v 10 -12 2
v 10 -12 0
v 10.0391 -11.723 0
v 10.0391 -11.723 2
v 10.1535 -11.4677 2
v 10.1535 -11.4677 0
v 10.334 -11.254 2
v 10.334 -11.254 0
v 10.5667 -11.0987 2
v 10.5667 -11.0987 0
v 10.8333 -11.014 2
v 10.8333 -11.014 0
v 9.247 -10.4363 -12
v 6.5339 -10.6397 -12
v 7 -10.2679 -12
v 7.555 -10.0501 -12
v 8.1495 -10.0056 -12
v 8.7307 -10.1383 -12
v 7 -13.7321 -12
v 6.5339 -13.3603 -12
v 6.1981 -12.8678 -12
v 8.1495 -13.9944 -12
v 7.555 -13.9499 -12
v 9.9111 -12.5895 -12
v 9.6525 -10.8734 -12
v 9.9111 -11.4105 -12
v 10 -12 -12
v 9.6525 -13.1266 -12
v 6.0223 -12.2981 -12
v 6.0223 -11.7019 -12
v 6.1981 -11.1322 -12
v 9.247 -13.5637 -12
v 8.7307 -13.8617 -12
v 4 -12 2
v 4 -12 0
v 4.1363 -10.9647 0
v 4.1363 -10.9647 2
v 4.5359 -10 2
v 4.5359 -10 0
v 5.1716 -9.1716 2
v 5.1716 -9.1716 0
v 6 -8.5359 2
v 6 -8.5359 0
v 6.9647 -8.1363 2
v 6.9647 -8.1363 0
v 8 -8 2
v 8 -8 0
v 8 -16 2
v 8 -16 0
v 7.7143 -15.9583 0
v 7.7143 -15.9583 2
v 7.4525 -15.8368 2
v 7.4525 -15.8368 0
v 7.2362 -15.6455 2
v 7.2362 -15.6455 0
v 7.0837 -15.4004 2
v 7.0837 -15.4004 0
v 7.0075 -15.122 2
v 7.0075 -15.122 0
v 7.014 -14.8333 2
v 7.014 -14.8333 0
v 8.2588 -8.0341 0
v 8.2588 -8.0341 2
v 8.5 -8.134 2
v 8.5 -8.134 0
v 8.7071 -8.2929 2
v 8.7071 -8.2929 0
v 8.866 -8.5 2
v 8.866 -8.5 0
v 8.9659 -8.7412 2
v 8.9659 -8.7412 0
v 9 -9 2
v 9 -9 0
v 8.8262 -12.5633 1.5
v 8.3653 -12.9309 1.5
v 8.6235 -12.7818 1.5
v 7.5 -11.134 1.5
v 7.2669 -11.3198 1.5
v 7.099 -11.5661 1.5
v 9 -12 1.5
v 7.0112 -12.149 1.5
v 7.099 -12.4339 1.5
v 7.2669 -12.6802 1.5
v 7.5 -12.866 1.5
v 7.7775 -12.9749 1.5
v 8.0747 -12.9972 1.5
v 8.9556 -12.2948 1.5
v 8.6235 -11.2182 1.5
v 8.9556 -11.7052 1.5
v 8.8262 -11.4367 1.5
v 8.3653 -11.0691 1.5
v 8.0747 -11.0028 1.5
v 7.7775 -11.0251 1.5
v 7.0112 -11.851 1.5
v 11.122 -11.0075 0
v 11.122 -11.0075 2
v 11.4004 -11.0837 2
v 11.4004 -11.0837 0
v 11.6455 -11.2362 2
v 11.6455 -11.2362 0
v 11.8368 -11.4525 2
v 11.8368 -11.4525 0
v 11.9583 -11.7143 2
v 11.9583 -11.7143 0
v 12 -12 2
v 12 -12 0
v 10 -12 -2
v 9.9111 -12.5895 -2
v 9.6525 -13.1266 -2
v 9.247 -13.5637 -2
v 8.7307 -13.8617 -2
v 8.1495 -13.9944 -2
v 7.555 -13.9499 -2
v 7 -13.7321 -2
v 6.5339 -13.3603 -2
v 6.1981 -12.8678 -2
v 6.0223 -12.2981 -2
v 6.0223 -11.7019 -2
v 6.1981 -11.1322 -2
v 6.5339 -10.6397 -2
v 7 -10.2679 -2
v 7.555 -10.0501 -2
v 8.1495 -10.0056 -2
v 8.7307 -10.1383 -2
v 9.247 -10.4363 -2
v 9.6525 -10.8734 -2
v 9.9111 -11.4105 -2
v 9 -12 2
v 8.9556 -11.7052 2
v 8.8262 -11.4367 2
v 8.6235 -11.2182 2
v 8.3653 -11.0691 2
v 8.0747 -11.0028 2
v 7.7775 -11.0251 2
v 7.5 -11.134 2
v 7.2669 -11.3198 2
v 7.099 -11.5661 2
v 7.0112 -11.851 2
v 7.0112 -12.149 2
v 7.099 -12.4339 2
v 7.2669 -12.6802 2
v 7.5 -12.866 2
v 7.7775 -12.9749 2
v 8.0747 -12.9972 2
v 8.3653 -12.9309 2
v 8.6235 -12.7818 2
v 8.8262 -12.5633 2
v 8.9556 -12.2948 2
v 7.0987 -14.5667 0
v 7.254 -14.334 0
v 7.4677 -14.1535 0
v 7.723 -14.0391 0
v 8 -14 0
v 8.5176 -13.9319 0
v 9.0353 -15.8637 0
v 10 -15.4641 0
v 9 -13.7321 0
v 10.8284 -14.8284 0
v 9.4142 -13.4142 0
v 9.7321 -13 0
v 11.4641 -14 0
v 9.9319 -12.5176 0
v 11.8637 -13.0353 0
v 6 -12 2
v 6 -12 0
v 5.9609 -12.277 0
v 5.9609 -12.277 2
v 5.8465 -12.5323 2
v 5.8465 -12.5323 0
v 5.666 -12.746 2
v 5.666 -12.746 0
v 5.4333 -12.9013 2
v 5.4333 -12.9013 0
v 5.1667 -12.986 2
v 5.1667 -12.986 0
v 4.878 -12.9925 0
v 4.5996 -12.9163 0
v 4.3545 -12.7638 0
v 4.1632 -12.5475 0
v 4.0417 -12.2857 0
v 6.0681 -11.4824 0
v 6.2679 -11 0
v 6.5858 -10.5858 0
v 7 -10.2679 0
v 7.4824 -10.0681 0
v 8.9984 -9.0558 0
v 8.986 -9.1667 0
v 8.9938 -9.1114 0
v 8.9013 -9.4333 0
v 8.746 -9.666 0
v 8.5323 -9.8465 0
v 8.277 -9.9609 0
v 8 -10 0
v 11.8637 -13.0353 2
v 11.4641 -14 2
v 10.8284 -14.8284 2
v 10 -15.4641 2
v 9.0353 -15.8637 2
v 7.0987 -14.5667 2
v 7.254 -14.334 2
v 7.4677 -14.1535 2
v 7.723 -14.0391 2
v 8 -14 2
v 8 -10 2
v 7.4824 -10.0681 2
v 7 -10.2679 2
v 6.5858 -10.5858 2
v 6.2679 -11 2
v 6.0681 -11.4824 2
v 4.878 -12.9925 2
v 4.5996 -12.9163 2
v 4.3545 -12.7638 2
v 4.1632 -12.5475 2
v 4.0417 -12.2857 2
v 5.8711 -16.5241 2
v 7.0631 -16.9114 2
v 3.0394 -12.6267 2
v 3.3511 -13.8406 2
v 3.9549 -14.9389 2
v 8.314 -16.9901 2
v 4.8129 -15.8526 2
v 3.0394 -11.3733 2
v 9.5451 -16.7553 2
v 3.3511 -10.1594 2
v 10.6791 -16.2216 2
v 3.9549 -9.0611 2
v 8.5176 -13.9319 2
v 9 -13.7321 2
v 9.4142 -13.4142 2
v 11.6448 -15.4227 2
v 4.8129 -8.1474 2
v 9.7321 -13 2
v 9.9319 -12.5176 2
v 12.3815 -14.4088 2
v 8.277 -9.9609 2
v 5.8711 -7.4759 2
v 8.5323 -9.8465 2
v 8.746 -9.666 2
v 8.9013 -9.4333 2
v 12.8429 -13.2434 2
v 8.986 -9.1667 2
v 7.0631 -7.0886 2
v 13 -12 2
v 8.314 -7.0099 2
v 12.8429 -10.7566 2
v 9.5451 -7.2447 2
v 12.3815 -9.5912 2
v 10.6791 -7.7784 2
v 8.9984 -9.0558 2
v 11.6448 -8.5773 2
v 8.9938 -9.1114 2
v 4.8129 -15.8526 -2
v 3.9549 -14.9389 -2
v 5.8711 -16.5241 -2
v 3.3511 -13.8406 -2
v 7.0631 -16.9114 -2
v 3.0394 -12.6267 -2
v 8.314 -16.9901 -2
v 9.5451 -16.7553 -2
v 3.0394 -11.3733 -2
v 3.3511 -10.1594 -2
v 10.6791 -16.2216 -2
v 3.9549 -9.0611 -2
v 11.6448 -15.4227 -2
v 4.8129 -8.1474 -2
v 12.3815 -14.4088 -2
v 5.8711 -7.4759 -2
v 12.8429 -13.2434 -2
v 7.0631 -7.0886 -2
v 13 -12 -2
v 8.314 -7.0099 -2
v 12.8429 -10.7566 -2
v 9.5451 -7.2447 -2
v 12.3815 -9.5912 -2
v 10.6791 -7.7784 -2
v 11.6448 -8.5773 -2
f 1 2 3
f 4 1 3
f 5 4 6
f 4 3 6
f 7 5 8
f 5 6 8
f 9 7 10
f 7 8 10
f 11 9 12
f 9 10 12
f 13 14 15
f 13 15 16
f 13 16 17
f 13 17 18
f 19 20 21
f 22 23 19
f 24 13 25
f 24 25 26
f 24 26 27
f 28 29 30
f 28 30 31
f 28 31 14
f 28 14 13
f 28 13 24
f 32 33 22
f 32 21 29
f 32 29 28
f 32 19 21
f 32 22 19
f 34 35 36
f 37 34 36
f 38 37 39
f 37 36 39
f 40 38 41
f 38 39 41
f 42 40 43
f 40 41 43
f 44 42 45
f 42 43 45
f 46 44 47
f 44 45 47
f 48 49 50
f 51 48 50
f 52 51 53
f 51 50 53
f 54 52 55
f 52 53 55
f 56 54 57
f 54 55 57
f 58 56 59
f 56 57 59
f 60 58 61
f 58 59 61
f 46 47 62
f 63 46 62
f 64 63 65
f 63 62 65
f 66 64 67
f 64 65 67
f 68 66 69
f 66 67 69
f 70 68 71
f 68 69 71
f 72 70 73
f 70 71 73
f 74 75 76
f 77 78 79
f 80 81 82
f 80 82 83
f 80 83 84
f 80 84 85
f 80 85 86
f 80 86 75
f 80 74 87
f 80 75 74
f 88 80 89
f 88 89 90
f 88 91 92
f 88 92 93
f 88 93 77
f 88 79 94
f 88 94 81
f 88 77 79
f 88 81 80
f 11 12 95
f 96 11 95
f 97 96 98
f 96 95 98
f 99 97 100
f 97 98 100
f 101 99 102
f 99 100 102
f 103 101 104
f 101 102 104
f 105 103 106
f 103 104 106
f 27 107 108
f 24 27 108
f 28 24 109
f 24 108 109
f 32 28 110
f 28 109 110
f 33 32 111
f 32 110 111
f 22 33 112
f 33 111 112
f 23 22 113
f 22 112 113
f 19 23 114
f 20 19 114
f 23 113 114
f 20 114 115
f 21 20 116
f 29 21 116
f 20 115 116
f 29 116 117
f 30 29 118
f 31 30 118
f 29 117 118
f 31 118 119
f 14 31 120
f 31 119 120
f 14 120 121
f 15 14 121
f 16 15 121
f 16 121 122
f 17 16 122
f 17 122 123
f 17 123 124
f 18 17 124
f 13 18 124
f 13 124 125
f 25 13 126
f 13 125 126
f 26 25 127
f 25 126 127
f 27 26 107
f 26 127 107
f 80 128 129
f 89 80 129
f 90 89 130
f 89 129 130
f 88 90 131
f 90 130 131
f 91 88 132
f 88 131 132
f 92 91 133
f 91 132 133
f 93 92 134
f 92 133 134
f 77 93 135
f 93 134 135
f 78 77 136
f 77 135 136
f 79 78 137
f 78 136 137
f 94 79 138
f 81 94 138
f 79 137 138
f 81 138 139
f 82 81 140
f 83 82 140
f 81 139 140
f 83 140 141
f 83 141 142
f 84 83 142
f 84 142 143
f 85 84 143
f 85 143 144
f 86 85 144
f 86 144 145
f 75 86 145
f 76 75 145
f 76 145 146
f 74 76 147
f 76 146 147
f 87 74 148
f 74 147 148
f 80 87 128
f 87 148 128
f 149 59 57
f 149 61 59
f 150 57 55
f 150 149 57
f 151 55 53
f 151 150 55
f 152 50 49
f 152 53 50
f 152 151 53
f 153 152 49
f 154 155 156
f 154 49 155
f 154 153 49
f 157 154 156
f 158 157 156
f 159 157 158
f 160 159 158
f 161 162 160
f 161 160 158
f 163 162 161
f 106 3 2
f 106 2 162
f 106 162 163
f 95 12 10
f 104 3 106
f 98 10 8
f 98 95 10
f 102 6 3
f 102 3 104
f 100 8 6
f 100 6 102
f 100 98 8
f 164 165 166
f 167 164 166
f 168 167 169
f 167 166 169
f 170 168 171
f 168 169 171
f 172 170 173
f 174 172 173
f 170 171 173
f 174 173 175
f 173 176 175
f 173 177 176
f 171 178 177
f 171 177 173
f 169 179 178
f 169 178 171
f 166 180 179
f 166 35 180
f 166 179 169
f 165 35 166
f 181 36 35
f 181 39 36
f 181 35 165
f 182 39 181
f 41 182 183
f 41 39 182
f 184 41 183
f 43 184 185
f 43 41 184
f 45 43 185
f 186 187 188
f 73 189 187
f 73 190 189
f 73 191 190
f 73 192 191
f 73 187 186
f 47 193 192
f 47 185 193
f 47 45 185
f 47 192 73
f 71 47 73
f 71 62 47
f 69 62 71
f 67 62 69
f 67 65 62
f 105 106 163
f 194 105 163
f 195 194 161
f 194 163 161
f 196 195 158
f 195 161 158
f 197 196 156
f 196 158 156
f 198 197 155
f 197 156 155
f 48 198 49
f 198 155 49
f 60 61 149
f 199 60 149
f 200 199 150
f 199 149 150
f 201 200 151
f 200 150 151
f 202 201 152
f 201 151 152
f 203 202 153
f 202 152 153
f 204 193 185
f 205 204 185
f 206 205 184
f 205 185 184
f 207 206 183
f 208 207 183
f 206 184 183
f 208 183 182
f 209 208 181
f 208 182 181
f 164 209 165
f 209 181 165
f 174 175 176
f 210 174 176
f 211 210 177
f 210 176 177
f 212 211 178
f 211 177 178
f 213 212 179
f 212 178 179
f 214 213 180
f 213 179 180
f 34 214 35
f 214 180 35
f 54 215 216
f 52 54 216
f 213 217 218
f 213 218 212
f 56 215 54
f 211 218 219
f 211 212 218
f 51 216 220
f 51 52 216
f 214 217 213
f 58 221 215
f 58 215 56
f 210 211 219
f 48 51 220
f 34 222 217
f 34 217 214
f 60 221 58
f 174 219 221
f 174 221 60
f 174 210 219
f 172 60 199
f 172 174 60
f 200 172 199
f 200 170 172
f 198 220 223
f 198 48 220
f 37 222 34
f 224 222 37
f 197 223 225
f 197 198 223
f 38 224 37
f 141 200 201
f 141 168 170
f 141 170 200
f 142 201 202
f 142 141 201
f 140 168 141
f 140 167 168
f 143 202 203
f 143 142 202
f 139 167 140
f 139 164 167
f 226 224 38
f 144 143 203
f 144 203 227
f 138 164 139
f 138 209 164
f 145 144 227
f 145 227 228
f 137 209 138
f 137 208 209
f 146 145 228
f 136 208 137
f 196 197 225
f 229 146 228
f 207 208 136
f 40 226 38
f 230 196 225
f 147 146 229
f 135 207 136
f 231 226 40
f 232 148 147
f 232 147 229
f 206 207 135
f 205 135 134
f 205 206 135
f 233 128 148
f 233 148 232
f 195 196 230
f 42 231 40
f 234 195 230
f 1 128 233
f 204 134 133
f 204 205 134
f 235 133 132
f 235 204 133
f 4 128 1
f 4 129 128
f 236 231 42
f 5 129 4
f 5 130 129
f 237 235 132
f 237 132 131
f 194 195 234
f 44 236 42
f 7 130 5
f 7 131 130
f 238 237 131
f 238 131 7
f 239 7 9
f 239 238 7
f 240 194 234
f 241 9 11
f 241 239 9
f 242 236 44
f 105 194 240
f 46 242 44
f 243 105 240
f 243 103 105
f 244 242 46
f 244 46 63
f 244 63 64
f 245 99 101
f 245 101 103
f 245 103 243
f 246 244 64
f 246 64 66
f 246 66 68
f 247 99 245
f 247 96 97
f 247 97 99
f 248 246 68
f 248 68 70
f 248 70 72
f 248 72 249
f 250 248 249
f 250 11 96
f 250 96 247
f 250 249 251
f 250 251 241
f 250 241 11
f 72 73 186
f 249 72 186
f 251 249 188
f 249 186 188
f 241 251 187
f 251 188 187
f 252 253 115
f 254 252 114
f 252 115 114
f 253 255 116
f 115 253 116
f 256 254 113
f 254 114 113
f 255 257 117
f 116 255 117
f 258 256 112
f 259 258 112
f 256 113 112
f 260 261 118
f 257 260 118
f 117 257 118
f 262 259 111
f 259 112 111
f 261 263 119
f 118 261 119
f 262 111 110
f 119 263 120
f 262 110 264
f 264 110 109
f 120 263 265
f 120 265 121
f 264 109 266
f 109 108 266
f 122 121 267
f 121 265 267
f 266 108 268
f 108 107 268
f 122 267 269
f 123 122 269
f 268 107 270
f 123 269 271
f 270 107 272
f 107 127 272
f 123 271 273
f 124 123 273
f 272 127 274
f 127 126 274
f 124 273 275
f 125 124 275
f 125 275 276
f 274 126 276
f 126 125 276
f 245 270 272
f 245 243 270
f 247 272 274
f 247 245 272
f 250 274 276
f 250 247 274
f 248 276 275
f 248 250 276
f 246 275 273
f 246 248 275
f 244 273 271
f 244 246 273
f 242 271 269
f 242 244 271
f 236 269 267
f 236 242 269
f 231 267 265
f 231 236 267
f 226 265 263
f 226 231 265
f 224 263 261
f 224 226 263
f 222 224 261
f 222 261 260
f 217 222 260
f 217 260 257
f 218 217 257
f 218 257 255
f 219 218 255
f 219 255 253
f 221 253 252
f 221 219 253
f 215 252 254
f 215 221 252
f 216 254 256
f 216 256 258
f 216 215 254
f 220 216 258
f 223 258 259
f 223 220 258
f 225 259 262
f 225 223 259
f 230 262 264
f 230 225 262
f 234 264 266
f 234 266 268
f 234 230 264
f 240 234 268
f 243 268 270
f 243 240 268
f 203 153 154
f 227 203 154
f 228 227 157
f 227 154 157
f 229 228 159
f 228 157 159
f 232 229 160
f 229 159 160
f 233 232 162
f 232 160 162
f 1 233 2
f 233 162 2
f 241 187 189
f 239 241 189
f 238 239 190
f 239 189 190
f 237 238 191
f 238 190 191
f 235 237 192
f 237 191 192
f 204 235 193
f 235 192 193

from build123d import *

# Parameters (mm, degrees)
F0_R     = 5
F0_R_2   = 1.5
F1_DEPTH = 2
F2_DEPTH = 2
F3_DEPTH = 2
F4_R     = 2
F4_R_2   = 1.5
F5_DEPTH = 10
F6_R     = 1
F7_DEPTH = 0.5


with BuildPart() as f1:
    # F0 (on Top) → F1 (new body)
    with BuildSketch(Plane.XY):
        with Locations((8, -12)):
            Circle(F0_R)
        with BuildLine():
            ThreePointArc((12, -12), (10.8284271247, -14.8284271247), (8, -16))
            ThreePointArc((8, -16), (7.2362373842, -15.6454972244), (7.0139867028, -14.8333333333))
            ThreePointArc((7.0139867028, -14.8333333333), (7.3545027756, -14.2362373842), (8, -14))
            ThreePointArc((8, -14), (9.4142135624, -13.4142135624), (10, -12))
            ThreePointArc((10, -12), (10.2362373842, -11.3545027756), (10.8333333333, -11.0139867028))
            ThreePointArc((10.8333333333, -11.0139867028), (11.6454972244, -11.2362373842), (12, -12))
        make_face(mode=Mode.SUBTRACT)
        with BuildLine():
            ThreePointArc((8, -10), (6.5857864376, -10.5857864376), (6, -12))
            ThreePointArc((6, -12), (5.7637626158, -12.6454972244), (5.1666666667, -12.9860132972))
            ThreePointArc((5.1666666667, -12.9860132972), (4.3545027756, -12.7637626158), (4, -12))
            ThreePointArc((4, -12), (5.1715728753, -9.1715728753), (8, -8))
            ThreePointArc((8, -8), (8.7071067812, -8.2928932188), (9, -9))
            ThreePointArc((9, -9), (8.9964971895, -9.0836262603), (8.9860132972, -9.1666666667))
            ThreePointArc((8.9860132972, -9.1666666667), (8.6454972244, -9.7637626158), (8, -10))
        make_face(mode=Mode.SUBTRACT)
        with Locations((8, -12)):
            Circle(F0_R_2, mode=Mode.SUBTRACT)
        with Locations((8, -12)):
            Circle(F0_R_2)
    extrude(amount=F1_DEPTH)

    # F0 (on Top) → F2 (join)
    with BuildSketch(Plane.XY):
        with Locations((8, -12)):
            Circle(F0_R)
        with BuildLine():
            ThreePointArc((12, -12), (10.8284271247, -14.8284271247), (8, -16))
            ThreePointArc((8, -16), (7.2362373842, -15.6454972244), (7.0139867028, -14.8333333333))
            ThreePointArc((7.0139867028, -14.8333333333), (7.3545027756, -14.2362373842), (8, -14))
            ThreePointArc((8, -14), (9.4142135624, -13.4142135624), (10, -12))
            ThreePointArc((10, -12), (10.2362373842, -11.3545027756), (10.8333333333, -11.0139867028))
            ThreePointArc((10.8333333333, -11.0139867028), (11.6454972244, -11.2362373842), (12, -12))
        make_face(mode=Mode.SUBTRACT)
        with BuildLine():
            ThreePointArc((8, -10), (6.5857864376, -10.5857864376), (6, -12))
            ThreePointArc((6, -12), (5.7637626158, -12.6454972244), (5.1666666667, -12.9860132972))
            ThreePointArc((5.1666666667, -12.9860132972), (4.3545027756, -12.7637626158), (4, -12))
            ThreePointArc((4, -12), (5.1715728753, -9.1715728753), (8, -8))
            ThreePointArc((8, -8), (8.7071067812, -8.2928932188), (9, -9))
            ThreePointArc((9, -9), (8.9964971895, -9.0836262603), (8.9860132972, -9.1666666667))
            ThreePointArc((8.9860132972, -9.1666666667), (8.6454972244, -9.7637626158), (8, -10))
        make_face(mode=Mode.SUBTRACT)
        with Locations((8, -12)):
            Circle(F0_R_2, mode=Mode.SUBTRACT)
        with BuildLine():
            ThreePointArc((9, -15), (8.7071067812, -15.7071067812), (8, -16))
            ThreePointArc((8, -16), (10.8284271247, -14.8284271247), (12, -12))
            ThreePointArc((12, -12), (11.6454972244, -12.7637626158), (10.8333333333, -12.9860132972))
            ThreePointArc((10.8333333333, -12.9860132972), (10.1213203436, -14.1213203436), (8.9860132972, -14.8333333333))
            ThreePointArc((8.9860132972, -14.8333333333), (8.9964971895, -14.9163737397), (9, -15))
        make_face()
        with BuildLine():
            ThreePointArc((8.9860132972, -14.8333333333), (10.1213203436, -14.1213203436), (10.8333333333, -12.9860132972))
            ThreePointArc((10.8333333333, -12.9860132972), (10.2362373842, -12.6454972244), (10, -12))
            ThreePointArc((10, -12), (9.4142135624, -13.4142135624), (8, -14))
            ThreePointArc((8, -14), (8.6454972244, -14.2362373842), (8.9860132972, -14.8333333333))
        make_face()
        with BuildLine():
            ThreePointArc((10.8333333333, -12.9860132972), (11.6454972244, -12.7637626158), (12, -12))
            ThreePointArc((12, -12), (11.6454972244, -11.2362373842), (10.8333333333, -11.0139867028))
            ThreePointArc((10.8333333333, -11.0139867028), (11, -12), (10.8333333333, -12.9860132972))
        make_face()
        with BuildLine():
            ThreePointArc((10.8333333333, -12.9860132972), (11, -12), (10.8333333333, -11.0139867028))
            ThreePointArc((10.8333333333, -11.0139867028), (10.2362373842, -11.3545027756), (10, -12))
            ThreePointArc((10, -12), (10.2362373842, -12.6454972244), (10.8333333333, -12.9860132972))
        make_face()
        with BuildLine():
            ThreePointArc((8, -14), (7.3545027756, -14.2362373842), (7.0139867028, -14.8333333333))
            ThreePointArc((7.0139867028, -14.8333333333), (8, -15), (8.9860132972, -14.8333333333))
            ThreePointArc((8.9860132972, -14.8333333333), (8.6454972244, -14.2362373842), (8, -14))
        make_face()
        with BuildLine():
            ThreePointArc((7.0139867028, -14.8333333333), (7.2362373842, -15.6454972244), (8, -16))
            ThreePointArc((8, -16), (8.7071067812, -15.7071067812), (9, -15))
            ThreePointArc((9, -15), (8.9964971895, -14.9163737397), (8.9860132972, -14.8333333333))
            ThreePointArc((8.9860132972, -14.8333333333), (8, -15), (7.0139867028, -14.8333333333))
        make_face()
        with BuildLine():
            ThreePointArc((7.0139867028, -9.1666666667), (7.3545027756, -9.7637626158), (8, -10))
            ThreePointArc((8, -10), (8.6454972244, -9.7637626158), (8.9860132972, -9.1666666667))
            ThreePointArc((8.9860132972, -9.1666666667), (8, -9), (7.0139867028, -9.1666666667))
        make_face()
        with BuildLine():
            ThreePointArc((8, -8), (7.2362373842, -8.3545027756), (7.0139867028, -9.1666666667))
            ThreePointArc((7.0139867028, -9.1666666667), (8, -9), (8.9860132972, -9.1666666667))
            ThreePointArc((8.9860132972, -9.1666666667), (8.9964971895, -9.0836262603), (9, -9))
            ThreePointArc((9, -9), (8.7071067812, -8.2928932188), (8, -8))
        make_face()
        with BuildLine():
            ThreePointArc((5.1666666667, -11.0139867028), (5.7637626158, -11.3545027756), (6, -12))
            ThreePointArc((6, -12), (6.5857864376, -10.5857864376), (8, -10))
            ThreePointArc((8, -10), (7.3545027756, -9.7637626158), (7.0139867028, -9.1666666667))
            ThreePointArc((7.0139867028, -9.1666666667), (7.2362373842, -8.3545027756), (8, -8))
            ThreePointArc((8, -8), (5.1715728753, -9.1715728753), (4, -12))
            ThreePointArc((4, -12), (4.3545027756, -11.2362373842), (5.1666666667, -11.0139867028))
        make_face()
        with BuildLine():
            ThreePointArc((5.1666666667, -12.9860132972), (5.7637626158, -12.6454972244), (6, -12))
            ThreePointArc((6, -12), (5.7637626158, -11.3545027756), (5.1666666667, -11.0139867028))
            ThreePointArc((5.1666666667, -11.0139867028), (5, -12), (5.1666666667, -12.9860132972))
        make_face()
        with BuildLine():
            ThreePointArc((5.1666666667, -12.9860132972), (5, -12), (5.1666666667, -11.0139867028))
            ThreePointArc((5.1666666667, -11.0139867028), (4.3545027756, -11.2362373842), (4, -12))
            ThreePointArc((4, -12), (4.3545027756, -12.7637626158), (5.1666666667, -12.9860132972))
        make_face()
    extrude(amount=-F2_DEPTH)

    # F0 (on Top) → F3 (join)
    with BuildSketch(Plane.XY):
        with Locations((8, -12)):
            Circle(F0_R_2)
    extrude(amount=-F3_DEPTH)

    # F4 (on face) → F5 (join)
    with BuildSketch(Plane(origin=(0, 0, -2), x_dir=(1, 0, 0), z_dir=(0, 0, -1))):
        with Locations((8, 12)):
            Circle(F4_R)
        with Locations((8, 12)):
            Circle(F4_R_2, mode=Mode.SUBTRACT)
        with Locations((8, 12)):
            Circle(F4_R_2)
    extrude(amount=F5_DEPTH)

    # F6 (on face) → F7 (cut)
    with BuildSketch(Plane.XY.offset(2)):
        with Locations((8, -12)):
            Circle(F6_R)
    extrude(amount=-F7_DEPTH, mode=Mode.SUBTRACT)


solid = f1.part
